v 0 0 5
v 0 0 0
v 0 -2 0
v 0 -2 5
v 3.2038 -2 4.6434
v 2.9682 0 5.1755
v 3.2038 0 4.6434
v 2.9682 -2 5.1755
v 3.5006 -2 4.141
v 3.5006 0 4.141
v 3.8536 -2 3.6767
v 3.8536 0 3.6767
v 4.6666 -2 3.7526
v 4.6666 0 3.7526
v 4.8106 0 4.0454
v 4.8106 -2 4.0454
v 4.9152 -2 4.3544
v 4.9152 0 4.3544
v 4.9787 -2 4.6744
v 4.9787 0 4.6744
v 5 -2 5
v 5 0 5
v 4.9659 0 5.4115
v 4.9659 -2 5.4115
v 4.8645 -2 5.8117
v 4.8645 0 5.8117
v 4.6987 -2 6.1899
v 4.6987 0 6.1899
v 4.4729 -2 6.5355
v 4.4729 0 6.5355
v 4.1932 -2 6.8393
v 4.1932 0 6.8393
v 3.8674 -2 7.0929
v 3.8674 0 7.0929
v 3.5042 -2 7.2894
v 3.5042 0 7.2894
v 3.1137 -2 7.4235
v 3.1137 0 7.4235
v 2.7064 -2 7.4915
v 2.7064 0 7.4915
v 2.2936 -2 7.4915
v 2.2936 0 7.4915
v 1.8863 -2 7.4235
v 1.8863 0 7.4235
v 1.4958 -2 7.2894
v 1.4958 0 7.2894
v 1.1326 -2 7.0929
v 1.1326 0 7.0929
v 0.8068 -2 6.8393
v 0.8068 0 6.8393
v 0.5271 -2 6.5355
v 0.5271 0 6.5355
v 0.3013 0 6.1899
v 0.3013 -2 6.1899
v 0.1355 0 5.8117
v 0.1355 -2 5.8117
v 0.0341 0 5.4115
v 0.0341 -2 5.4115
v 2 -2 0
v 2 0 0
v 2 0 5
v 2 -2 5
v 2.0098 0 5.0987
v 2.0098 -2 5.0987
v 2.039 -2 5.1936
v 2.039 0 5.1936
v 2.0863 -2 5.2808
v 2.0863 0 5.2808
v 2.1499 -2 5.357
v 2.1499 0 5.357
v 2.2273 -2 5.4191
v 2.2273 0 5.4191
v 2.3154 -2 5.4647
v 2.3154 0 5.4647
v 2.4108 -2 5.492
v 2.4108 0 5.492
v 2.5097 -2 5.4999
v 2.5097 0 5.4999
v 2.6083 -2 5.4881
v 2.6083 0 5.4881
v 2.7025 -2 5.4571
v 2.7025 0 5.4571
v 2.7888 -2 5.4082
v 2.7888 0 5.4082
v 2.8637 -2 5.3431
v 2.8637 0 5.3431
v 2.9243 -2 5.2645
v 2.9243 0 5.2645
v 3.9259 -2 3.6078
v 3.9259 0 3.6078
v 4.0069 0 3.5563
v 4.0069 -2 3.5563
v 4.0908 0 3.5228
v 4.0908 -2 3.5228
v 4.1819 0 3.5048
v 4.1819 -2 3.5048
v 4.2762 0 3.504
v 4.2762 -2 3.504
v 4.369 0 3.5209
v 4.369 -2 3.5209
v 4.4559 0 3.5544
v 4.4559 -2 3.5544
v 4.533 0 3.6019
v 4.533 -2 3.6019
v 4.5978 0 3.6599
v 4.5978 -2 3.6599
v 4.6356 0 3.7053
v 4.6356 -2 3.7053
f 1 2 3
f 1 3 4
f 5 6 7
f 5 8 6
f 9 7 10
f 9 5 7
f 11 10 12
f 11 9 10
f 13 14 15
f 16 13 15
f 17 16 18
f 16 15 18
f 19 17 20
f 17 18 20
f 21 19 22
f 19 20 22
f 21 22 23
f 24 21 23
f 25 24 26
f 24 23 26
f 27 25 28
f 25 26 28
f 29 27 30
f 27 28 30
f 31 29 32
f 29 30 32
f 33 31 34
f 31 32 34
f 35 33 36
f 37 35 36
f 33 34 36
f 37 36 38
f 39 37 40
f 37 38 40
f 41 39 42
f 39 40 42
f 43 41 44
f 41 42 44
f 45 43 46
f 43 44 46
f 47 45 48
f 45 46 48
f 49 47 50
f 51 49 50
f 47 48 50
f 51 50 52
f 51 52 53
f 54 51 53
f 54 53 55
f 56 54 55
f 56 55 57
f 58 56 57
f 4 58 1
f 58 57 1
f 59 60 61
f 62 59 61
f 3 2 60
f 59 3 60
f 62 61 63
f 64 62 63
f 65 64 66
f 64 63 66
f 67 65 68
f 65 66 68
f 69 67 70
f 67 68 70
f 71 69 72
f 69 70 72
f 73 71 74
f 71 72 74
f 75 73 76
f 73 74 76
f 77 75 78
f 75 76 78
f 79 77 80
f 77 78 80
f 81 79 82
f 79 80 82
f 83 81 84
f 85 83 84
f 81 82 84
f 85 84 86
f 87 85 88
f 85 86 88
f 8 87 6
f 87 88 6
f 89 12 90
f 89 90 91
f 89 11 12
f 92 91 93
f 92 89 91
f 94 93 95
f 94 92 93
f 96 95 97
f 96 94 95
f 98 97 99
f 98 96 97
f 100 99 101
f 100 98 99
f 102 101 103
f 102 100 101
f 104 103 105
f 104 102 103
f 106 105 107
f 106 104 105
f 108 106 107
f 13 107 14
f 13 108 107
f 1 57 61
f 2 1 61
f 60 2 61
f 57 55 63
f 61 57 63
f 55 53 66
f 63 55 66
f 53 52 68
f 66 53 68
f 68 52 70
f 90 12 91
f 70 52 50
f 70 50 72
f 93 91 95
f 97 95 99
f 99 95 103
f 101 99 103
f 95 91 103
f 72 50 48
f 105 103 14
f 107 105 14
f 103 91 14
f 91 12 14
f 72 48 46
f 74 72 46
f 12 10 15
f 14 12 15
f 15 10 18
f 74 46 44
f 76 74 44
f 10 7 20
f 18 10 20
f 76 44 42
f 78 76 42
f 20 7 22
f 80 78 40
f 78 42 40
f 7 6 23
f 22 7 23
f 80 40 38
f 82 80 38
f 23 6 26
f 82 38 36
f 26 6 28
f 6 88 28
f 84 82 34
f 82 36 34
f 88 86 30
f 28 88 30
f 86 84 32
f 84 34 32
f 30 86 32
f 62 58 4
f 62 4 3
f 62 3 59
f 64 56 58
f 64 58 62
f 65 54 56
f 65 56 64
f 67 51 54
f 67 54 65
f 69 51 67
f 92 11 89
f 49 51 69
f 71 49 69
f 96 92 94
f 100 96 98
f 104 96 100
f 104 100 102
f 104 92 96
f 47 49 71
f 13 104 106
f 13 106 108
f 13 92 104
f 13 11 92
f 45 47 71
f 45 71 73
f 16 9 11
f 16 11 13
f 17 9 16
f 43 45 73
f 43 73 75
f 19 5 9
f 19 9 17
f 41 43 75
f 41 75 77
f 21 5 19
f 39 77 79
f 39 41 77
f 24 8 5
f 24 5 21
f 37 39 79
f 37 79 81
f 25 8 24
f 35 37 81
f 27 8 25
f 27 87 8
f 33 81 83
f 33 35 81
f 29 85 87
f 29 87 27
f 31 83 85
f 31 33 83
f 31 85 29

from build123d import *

# Parameters (mm, degrees)
F0_W     = 2
F0_H     = 5
F1_DEPTH = 2
F2_R     = 5
F3_R     = 0.5


with BuildPart() as f1:
    # F0 (on Front) → F1 (new body)
    with BuildSketch(Plane.XZ):
        with Locations((1, 2.5)):
            Rectangle(F0_W, F0_H)
        with BuildLine():
            ThreePointArc((5, 5), (2.5, 7.5), (0, 5))
            Line((0, 5), (2, 5))
            ThreePointArc((2, 5), (2.5, 5.5), (3, 5))
            Line((3, 5), (5, 5))
        make_face()
        with BuildLine():
            ThreePointArc((4.272967, 3.237449), (4.811106, 4.046695), (5, 5))
            Line((5, 5), (3, 5))
            ThreePointArc((3, 5), (2.962221, 4.809339), (2.854593, 4.64749))
            Line((2.854593, 4.64749), (4.272967, 3.237449))
        make_face()
    extrude(amount=F1_DEPTH)

    # F2
    f2_edges = [f1.edges().sort_by_distance(p)[0] for p in [
        (2.854593, -1, 4.64749),
    ]]
    fillet(f2_edges, radius=F2_R)

    # F3
    f3_edges = [f1.edges().sort_by_distance(p)[0] for p in [
        (4.272967, -1, 3.237449),
    ]]
    fillet(f3_edges, radius=F3_R)


solid = f1.part
